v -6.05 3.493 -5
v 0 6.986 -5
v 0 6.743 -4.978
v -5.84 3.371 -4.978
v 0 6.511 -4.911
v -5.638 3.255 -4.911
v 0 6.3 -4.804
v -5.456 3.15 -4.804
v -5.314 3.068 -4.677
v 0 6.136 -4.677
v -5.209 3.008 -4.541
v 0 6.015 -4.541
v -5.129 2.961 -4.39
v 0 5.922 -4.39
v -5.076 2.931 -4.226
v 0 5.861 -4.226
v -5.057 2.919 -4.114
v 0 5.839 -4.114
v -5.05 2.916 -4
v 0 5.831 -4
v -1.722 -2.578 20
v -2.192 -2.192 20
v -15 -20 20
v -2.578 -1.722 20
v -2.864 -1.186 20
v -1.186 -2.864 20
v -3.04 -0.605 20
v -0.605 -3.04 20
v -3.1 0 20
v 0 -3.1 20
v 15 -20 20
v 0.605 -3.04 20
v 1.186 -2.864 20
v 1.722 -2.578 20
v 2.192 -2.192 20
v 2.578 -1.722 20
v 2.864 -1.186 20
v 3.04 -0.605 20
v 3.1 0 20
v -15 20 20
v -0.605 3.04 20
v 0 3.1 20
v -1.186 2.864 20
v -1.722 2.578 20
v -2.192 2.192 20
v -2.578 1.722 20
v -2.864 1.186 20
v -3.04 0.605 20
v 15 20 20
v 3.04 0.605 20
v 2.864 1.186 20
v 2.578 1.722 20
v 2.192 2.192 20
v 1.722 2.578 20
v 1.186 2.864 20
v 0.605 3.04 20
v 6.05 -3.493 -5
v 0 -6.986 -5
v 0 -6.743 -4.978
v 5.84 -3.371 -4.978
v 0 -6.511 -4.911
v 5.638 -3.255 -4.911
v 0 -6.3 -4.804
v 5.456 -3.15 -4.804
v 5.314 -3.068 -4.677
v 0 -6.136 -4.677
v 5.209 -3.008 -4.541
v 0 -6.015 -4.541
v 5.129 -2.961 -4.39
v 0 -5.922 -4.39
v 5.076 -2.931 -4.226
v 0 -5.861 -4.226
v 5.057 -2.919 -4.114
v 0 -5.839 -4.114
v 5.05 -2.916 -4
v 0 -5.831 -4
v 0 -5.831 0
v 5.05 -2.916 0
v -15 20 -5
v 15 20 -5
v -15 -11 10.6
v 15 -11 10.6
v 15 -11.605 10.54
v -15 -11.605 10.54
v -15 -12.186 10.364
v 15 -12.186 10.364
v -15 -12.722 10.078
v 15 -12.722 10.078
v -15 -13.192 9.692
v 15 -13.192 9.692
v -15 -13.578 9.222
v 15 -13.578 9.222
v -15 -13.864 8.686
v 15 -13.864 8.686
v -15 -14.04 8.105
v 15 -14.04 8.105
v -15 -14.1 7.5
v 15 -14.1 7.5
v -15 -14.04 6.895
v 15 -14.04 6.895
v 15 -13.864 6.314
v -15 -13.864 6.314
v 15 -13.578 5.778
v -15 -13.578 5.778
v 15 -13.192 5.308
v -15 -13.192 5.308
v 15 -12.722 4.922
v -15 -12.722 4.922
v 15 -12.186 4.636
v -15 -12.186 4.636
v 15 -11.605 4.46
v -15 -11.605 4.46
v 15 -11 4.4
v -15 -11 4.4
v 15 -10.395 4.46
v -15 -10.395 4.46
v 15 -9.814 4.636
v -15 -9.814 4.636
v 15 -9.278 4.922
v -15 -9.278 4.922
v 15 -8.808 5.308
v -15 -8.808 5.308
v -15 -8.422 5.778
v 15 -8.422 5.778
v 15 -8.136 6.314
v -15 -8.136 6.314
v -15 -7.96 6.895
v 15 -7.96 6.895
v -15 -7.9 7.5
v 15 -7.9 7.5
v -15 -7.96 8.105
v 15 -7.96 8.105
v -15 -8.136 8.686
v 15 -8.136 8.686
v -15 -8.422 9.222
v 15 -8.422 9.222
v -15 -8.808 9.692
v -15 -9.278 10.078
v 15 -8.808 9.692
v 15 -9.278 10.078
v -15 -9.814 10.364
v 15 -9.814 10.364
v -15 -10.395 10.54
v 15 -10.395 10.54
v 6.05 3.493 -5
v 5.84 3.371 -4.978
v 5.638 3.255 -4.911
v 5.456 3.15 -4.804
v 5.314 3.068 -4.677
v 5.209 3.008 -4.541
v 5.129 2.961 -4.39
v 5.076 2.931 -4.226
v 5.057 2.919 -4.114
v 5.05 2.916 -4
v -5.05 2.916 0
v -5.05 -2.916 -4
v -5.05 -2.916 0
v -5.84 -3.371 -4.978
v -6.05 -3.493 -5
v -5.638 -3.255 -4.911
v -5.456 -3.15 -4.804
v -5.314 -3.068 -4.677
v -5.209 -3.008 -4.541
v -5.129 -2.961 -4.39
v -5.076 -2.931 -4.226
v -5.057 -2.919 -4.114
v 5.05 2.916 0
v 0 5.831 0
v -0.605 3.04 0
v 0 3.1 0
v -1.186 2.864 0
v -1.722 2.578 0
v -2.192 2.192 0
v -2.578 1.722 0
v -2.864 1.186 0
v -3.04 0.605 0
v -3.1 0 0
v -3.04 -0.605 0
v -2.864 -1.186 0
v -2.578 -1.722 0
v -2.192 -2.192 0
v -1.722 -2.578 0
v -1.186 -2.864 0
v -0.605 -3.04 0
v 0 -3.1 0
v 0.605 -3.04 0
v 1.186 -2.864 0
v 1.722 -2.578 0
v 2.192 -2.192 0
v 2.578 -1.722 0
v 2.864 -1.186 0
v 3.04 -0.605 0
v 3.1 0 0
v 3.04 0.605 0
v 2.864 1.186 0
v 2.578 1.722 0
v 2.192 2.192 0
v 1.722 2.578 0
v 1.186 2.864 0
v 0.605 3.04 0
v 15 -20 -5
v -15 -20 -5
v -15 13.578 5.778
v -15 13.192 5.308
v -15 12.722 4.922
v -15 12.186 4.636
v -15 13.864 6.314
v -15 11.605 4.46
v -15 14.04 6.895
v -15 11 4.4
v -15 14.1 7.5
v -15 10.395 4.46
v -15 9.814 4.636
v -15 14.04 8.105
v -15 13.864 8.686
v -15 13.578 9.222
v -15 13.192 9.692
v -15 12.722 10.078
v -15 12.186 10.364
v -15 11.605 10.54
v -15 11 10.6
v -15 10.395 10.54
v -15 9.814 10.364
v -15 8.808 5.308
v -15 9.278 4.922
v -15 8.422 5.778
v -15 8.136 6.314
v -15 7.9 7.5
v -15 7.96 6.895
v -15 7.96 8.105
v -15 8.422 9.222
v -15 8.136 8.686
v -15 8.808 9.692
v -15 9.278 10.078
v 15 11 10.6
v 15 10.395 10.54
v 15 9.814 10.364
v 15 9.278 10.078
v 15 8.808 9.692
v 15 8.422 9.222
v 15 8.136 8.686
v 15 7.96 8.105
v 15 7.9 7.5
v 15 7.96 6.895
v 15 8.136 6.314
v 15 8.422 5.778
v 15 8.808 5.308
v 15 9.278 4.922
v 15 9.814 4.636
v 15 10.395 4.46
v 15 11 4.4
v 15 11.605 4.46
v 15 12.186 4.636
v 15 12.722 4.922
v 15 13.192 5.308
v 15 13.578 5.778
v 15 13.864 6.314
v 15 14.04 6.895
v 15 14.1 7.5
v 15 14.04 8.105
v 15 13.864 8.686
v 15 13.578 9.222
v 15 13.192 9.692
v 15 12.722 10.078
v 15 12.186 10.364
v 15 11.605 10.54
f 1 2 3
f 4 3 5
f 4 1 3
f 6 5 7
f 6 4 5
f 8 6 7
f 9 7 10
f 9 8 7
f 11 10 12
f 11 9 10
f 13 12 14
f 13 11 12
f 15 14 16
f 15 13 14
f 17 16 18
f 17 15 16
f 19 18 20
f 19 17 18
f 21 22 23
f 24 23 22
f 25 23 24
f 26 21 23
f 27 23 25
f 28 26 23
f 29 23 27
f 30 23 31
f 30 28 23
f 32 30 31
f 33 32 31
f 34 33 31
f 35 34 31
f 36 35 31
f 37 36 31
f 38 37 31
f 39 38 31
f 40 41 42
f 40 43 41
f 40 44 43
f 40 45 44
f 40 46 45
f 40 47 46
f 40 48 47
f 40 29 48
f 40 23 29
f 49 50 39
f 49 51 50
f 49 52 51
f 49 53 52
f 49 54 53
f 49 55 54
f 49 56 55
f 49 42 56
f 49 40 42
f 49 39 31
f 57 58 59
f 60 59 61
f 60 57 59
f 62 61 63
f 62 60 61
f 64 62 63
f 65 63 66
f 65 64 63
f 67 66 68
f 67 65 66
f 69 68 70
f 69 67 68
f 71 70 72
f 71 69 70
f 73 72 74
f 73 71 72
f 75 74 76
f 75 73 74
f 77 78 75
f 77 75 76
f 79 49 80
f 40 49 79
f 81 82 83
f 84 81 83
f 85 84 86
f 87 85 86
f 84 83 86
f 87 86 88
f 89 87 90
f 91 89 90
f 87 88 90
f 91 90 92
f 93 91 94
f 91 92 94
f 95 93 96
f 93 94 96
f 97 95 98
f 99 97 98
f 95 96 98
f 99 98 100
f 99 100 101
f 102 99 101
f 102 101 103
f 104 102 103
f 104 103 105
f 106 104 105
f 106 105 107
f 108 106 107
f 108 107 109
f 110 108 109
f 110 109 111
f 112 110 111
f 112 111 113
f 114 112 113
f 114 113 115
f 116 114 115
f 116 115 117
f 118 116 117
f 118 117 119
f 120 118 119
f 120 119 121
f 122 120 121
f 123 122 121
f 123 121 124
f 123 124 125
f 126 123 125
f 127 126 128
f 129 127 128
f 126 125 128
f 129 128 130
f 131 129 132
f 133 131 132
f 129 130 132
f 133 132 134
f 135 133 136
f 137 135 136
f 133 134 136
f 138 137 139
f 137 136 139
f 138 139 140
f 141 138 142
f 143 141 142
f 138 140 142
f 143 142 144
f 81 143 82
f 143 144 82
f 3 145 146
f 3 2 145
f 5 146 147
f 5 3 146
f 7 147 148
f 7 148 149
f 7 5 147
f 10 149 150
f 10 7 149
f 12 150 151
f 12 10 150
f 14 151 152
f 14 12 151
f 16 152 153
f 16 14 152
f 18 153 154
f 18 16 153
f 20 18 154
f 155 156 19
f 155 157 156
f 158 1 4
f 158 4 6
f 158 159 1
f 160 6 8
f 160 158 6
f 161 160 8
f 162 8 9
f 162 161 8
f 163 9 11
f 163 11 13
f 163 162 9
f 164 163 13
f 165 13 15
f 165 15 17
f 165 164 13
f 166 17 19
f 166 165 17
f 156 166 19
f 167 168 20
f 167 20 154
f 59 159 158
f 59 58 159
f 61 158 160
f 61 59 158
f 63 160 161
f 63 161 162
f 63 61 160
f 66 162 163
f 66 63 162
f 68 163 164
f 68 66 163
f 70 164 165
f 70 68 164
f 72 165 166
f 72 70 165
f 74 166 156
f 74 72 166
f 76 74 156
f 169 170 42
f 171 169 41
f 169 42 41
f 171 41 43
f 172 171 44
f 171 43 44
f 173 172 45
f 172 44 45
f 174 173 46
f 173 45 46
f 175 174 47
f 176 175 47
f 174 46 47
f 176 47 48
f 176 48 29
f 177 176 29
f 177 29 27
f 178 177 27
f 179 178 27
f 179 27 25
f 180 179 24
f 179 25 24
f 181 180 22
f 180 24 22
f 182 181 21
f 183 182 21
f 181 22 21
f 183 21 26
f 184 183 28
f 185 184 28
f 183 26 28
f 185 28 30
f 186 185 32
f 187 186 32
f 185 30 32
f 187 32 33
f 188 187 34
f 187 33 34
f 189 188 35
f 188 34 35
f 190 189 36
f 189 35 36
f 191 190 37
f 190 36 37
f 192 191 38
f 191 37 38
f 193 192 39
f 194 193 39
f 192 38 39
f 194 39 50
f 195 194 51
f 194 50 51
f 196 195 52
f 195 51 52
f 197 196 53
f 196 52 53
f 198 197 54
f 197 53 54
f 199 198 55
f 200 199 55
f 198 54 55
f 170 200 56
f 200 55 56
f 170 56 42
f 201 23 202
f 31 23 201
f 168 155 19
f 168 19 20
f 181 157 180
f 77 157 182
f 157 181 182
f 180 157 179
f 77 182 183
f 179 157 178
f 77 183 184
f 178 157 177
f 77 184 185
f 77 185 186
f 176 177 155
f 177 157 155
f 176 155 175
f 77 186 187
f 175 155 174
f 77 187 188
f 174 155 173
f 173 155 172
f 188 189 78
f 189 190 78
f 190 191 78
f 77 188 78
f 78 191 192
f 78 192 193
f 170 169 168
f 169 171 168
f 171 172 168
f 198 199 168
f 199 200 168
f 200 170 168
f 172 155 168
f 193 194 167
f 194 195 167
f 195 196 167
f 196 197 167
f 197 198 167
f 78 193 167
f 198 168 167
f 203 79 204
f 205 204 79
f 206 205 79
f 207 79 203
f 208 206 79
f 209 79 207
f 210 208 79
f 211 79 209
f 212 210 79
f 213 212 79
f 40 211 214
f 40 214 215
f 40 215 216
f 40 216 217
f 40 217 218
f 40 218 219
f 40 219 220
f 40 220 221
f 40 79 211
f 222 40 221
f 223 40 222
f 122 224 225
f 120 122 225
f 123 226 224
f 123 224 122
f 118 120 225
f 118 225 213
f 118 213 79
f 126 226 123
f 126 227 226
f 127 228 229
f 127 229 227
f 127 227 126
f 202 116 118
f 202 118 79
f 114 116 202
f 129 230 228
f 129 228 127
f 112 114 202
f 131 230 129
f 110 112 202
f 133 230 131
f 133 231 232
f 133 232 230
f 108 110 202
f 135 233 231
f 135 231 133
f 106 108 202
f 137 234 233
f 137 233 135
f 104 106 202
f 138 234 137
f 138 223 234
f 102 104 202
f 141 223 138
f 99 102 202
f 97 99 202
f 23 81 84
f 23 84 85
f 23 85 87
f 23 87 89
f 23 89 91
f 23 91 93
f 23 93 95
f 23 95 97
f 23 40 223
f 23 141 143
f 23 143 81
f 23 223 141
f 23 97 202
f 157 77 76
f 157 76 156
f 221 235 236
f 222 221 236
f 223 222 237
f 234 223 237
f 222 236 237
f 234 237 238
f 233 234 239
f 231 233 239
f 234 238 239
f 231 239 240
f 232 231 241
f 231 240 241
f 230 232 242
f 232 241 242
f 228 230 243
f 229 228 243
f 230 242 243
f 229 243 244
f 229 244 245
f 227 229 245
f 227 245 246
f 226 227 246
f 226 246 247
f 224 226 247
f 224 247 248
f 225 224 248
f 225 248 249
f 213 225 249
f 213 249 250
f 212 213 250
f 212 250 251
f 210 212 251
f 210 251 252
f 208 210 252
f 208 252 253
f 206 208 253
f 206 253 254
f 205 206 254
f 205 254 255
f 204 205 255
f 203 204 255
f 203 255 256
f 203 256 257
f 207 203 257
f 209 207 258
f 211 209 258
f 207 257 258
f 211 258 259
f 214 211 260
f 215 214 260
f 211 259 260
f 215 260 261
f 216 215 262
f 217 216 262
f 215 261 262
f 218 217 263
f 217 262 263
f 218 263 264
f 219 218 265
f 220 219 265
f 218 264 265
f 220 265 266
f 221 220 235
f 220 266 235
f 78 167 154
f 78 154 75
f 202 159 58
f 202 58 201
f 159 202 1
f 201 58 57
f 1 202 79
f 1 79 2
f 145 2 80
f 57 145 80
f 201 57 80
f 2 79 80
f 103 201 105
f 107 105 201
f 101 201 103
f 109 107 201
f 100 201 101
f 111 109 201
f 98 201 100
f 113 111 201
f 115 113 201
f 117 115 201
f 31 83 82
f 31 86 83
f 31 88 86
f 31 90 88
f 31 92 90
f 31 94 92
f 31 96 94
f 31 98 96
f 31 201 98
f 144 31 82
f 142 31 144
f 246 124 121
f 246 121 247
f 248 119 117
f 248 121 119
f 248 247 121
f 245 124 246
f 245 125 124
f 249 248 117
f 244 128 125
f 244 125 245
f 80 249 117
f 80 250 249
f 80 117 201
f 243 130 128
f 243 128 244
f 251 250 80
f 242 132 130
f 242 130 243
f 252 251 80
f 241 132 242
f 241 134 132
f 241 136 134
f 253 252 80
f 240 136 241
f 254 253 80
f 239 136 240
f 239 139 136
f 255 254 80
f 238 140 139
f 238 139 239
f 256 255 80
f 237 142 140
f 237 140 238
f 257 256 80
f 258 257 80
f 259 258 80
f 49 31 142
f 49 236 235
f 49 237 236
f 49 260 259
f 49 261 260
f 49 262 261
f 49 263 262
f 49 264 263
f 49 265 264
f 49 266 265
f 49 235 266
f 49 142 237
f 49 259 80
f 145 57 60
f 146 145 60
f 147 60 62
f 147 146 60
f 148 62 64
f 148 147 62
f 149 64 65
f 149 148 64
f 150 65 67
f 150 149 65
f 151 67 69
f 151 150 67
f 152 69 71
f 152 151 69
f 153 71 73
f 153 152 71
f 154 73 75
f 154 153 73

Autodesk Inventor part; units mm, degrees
ref_plane "YZ Plane" through (0, 0, 0) normal (1, 0, 0) x (0, 1, 0)
ref_plane "XZ Plane" through (0, 0, 0) normal (0, 1, 0) x (-1, 0, 0)
ref_plane "XY Plane" through (0, 0, 0) normal (0, 0, 1) x (1, 0, 0)
sketch "Szkic1" plane through (0, 0, 0) normal (0, 0, 1) x (1, 0, 0)
  line L0 (-21, 0) -> (21, 0) construction
  line L1 (0, -28) -> (0, 28) construction
  circle A0 centre (0, 0) radius 3
  circle A1 centre (0, 0) radius 5.05
  line L2 (15, 20) -> (-15, 20)
  line L3 (-15, 20) -> (-15, -20)
  line L4 (-15, -20) -> (15, -20)
  line L5 (15, -20) -> (15, 20)
  line L6 (15, 20) -> (-15, -20) construction
  line L7 (-15, 20) -> (15, -20) construction
  line L8 (5.05, 2.9156) -> (5.05, -2.9156)
  line L9 (0, 5.8312) -> (5.05, 2.9156)
  line L10 (-5.05, 2.9156) -> (0, 5.8312)
  line L11 (-5.05, -2.9156) -> (-5.05, 2.9156)
  line L12 (0, -5.8312) -> (-5.05, -2.9156)
  line L13 (5.05, -2.9156) -> (0, -5.8312)
  point P0 (5.05, -2.9156)
  dimension "d0" = 6
  dimension "d1" = 10.1
  dimension "d2" = 30
  dimension "d3" = 40
  dimension "d8" = 360
extrude "Wyciągnięcie proste1" add sketch "Szkic1" along normal blind 20 contours A1 | L8 L13 A1 | A1 L9 L8 | A1 L10 L9 | L13 L12 A1 | A1 L11 L10 | L12 L11 A1 | L5 L4 L3 L2
extrude "Wyciągnięcie proste2" add sketch "Szkic1" against normal blind 5 contours L5 L4 L3 L2
fillet "Zaokrąglenie1" radius 1 6 edges at (5.05, 0, -5) (2.525, 4.3734, -5) (-2.525, 4.3734, -5) (-5.05, 0, -5) (-2.525, -4.3734, -5) (2.525, -4.3734, -5)
sketch "Szkic2" plane through (-15, -20, 20) normal (-1, 0, 0) x (0, 0, 1)
  line L0 (-25, 0) -> (-25, 40) projected
  line L1 (-20, -8) -> (-20, 48) construction
  line L2 (-30.5, 20) -> (8, 20) construction
  circle A0 centre (-12.5, 31) radius 3
  circle A1 centre (-12.5, 9) radius 3
  circle A2 centre (-12.5, 31) radius 7.5
  circle A3 centre (-12.5, 9) radius 7.5
  point P0 (-20, 20)
  dimension "d14" = 6
  dimension "d15" = 7.5
  dimension "d16" = 11
  dimension "d17" = 15
extrude "Wyciągnięcie proste3" cut sketch "Szkic2" against normal through all contours A0 | A1
hole "Otwór1" at (-15, -11, 7.5) at (-15, 11, 7.5) direction (1, 0, 0) diameter 6.2 end through all
hole "Otwór2" at (0, 0, 0) direction (0, 0, -1) diameter 6.2 end through all
hole "Otwór3" at (0, 0, 0) direction (0, 0, 1) diameter 6.2 end through all
properties part number "uMule-Uchwyt_koła"
